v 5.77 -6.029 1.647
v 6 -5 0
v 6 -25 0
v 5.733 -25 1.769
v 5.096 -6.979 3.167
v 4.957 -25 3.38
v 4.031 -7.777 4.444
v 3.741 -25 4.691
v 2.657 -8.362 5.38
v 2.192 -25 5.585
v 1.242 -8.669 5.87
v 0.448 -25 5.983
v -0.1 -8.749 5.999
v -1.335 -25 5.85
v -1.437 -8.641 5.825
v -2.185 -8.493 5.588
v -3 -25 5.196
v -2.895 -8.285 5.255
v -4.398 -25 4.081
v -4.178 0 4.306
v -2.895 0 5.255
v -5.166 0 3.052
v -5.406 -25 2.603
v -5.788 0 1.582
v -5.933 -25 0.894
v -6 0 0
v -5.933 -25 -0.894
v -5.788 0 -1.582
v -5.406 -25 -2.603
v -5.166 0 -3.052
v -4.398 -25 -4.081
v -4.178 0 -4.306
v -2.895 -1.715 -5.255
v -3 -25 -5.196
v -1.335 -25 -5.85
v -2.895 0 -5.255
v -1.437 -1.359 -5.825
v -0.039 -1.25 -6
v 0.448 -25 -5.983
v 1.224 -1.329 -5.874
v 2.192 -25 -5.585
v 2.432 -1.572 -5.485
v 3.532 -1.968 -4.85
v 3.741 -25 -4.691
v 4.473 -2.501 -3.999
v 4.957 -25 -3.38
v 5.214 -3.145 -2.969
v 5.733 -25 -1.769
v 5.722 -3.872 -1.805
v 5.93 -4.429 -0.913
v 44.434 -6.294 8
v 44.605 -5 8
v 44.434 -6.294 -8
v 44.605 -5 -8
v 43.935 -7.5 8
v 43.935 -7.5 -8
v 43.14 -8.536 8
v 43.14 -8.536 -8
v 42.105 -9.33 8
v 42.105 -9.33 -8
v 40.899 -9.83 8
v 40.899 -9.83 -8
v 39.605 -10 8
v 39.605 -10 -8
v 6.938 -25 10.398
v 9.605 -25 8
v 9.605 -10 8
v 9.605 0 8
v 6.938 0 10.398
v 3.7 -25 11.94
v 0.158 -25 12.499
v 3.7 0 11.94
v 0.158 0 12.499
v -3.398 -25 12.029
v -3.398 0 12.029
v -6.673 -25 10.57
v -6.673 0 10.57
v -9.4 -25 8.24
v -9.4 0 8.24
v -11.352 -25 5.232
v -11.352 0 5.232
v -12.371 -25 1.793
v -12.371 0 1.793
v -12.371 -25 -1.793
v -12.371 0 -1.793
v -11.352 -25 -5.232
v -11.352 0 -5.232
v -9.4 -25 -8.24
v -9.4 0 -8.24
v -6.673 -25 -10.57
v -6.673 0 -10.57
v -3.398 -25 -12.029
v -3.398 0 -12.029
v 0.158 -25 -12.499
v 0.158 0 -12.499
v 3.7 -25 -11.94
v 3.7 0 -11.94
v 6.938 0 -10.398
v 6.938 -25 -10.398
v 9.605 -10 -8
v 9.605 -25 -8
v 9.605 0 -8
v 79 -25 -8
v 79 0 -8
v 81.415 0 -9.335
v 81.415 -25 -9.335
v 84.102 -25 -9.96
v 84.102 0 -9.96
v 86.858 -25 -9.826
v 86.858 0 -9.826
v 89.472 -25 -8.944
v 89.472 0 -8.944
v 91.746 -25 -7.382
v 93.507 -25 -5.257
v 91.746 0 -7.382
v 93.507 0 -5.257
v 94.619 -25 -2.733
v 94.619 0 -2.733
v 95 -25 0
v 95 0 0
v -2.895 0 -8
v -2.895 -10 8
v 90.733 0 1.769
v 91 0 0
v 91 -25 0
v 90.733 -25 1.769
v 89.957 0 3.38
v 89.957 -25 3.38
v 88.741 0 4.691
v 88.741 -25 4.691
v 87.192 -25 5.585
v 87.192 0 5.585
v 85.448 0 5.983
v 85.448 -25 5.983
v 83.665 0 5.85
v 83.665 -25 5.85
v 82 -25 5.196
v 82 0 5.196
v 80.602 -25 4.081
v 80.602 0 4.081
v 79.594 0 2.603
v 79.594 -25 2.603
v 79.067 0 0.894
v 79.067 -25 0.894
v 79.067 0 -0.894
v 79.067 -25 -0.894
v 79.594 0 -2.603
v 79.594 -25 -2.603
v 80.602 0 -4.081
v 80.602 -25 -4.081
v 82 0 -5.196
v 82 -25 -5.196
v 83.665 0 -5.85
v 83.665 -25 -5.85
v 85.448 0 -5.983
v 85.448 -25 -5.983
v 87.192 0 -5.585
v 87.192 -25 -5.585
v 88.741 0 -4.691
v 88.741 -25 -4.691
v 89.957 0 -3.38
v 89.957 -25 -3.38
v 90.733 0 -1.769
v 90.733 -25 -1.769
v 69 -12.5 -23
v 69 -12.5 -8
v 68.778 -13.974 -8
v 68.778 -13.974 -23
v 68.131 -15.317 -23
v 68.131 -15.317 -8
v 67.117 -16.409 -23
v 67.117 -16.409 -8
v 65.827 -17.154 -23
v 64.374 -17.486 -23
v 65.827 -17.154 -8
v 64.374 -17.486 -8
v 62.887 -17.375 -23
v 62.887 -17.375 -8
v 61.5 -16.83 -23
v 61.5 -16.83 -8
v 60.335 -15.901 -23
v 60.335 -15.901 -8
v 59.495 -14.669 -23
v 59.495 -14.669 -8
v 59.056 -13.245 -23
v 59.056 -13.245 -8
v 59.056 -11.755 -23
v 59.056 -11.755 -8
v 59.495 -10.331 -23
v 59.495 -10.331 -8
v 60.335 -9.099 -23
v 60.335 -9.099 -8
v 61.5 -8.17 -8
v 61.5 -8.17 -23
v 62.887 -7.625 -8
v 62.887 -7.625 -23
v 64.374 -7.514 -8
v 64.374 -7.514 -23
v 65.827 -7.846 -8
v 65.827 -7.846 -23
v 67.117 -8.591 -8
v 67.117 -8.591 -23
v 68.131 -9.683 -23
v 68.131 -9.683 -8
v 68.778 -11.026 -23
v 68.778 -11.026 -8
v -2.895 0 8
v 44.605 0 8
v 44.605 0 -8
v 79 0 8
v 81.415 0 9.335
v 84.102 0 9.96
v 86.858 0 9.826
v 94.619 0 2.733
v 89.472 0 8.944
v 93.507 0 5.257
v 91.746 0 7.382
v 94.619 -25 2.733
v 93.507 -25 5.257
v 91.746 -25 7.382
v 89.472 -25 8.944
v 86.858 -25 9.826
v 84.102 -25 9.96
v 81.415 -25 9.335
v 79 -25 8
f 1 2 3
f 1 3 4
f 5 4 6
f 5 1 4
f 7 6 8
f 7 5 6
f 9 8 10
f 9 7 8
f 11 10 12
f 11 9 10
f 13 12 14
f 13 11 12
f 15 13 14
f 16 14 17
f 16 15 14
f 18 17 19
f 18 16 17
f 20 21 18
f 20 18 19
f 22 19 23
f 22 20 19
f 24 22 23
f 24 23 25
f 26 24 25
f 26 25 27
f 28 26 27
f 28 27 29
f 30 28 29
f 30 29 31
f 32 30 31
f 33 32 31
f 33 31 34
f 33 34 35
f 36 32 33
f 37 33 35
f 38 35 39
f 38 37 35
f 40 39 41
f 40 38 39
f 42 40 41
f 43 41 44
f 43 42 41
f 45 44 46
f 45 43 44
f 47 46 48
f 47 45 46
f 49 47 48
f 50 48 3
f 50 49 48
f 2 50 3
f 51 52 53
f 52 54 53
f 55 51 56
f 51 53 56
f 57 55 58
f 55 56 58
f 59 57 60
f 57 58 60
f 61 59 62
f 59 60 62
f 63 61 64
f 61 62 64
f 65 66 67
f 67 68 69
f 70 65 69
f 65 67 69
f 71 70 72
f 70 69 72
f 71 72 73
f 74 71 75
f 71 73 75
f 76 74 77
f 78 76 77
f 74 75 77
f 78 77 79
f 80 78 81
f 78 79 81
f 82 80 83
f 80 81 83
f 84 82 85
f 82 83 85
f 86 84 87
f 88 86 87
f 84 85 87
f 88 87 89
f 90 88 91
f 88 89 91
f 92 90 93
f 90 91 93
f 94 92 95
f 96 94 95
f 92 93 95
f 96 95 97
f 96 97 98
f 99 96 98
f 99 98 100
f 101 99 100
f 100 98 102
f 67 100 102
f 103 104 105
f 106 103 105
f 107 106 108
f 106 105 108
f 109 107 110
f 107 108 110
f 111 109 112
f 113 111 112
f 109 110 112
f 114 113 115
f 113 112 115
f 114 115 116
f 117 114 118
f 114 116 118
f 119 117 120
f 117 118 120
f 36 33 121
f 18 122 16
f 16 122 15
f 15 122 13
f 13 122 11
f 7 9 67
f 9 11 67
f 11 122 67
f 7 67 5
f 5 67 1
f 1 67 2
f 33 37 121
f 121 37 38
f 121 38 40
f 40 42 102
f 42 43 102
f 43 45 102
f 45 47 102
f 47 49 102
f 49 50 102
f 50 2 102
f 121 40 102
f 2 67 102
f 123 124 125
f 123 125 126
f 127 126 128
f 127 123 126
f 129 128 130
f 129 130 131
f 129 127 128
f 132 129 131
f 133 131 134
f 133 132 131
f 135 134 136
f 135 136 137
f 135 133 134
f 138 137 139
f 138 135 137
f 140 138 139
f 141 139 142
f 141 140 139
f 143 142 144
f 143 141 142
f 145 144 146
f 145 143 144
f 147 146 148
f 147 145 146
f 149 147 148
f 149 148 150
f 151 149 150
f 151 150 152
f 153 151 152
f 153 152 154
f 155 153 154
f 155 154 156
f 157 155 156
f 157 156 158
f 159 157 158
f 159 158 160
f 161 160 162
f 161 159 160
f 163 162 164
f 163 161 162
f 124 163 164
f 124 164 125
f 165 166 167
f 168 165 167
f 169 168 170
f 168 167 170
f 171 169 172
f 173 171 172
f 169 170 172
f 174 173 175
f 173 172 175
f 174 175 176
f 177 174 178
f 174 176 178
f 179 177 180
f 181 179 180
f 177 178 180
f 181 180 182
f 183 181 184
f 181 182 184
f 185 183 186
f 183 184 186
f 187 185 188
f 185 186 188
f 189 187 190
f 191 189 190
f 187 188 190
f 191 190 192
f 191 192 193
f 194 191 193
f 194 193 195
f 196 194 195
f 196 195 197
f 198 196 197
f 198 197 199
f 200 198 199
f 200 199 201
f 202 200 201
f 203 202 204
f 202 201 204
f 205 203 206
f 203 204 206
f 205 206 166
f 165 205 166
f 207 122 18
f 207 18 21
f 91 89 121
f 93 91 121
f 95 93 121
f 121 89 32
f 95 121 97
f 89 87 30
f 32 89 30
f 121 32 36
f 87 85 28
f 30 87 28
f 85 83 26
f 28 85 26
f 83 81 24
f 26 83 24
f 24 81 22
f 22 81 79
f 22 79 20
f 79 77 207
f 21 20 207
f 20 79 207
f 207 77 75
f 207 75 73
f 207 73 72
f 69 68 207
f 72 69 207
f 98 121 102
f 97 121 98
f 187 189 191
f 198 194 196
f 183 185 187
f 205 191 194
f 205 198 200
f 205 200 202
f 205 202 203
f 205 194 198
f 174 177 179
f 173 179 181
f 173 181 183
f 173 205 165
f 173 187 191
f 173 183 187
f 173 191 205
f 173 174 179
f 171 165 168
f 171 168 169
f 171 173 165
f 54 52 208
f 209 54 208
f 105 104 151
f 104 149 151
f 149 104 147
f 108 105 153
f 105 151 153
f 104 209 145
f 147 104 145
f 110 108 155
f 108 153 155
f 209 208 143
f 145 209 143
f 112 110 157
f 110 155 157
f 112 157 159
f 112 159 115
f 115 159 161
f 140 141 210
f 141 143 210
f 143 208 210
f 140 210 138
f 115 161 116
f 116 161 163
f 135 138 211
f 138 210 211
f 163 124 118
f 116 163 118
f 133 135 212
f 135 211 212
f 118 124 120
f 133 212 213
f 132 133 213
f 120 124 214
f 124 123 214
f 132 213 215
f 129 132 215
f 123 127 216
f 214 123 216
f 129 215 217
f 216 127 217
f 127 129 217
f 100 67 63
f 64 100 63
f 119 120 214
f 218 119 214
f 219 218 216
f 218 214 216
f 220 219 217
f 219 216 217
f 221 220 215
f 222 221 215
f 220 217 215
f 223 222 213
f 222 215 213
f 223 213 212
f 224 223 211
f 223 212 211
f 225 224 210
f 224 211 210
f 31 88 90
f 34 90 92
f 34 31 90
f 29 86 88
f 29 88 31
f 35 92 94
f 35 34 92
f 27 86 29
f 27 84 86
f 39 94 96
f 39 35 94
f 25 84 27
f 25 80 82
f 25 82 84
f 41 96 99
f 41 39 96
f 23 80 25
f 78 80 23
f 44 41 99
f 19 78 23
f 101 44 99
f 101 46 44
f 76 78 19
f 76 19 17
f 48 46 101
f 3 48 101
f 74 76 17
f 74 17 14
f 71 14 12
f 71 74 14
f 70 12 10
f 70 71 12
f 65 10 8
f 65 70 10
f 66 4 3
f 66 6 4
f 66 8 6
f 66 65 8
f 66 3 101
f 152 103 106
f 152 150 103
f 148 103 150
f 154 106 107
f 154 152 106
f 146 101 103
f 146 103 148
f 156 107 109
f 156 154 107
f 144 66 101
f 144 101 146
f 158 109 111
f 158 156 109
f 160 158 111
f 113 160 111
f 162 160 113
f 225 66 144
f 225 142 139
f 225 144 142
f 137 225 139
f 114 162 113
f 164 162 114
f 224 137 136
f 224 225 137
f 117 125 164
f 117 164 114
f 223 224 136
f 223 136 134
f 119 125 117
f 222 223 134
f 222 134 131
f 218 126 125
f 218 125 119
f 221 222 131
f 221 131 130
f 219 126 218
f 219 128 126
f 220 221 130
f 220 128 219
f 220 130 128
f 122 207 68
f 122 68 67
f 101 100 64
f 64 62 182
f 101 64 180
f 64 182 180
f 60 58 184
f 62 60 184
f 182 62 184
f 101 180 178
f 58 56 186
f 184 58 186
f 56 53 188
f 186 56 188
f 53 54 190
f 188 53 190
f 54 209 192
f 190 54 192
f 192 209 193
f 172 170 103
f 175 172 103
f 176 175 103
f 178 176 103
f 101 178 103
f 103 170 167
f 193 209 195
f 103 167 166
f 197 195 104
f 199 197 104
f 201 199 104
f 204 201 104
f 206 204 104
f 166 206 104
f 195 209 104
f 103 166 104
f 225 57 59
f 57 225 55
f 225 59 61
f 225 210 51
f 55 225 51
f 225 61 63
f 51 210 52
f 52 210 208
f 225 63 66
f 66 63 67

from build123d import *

# Parameters (mm, degrees)
F0_R     = 6
F1_DEPTH = 25
F2_W     = 35
F2_H     = 10
F3_DEPTH = 20.501
F5_DEPTH = 12.5
F6_R     = 5
F7_R     = 5
F8_DEPTH = 15


with BuildPart() as f1:
    # F0 (on Front) → F1 (new body)
    with BuildSketch(Plane.XZ):
        with BuildLine():
            ThreePointArc((9.604686, -8), (11.753905, -4.253905), (12.5, 0))
            ThreePointArc((12.5, 0), (11.753905, 4.253905), (9.604686, 8))
            ThreePointArc((9.604686, 8), (-12.5, 0), (9.604686, -8))
        make_face()
        Circle(F0_R, mode=Mode.SUBTRACT)
        with BuildLine():
            ThreePointArc((9.604686, 8), (11.753905, 4.253905), (12.5, 0))
            ThreePointArc((12.5, 0), (11.753905, -4.253905), (9.604686, -8))
            Line((9.604686, -8), (79, -8))
            ThreePointArc((79, -8), (75, 0), (79, 8))
            Line((79, 8), (9.604686, 8))
        make_face()
        with BuildLine():
            ThreePointArc((95, 0), (89.472136, 8.944272), (79, 8))
            ThreePointArc((79, 8), (75, 0), (79, -8))
            ThreePointArc((79, -8), (89.472136, -8.944272), (95, 0))
        make_face()
        with Locations((85, 0)):
            Circle(F0_R, mode=Mode.SUBTRACT)
    extrude(amount=F1_DEPTH)

    # F2 (on face) → F3 (cut, through all)
    with BuildSketch(Plane.XY.offset(8)):
        with Locations((27.104686, -5)):
            Rectangle(F2_W, F2_H)
    extrude(amount=-F3_DEPTH, mode=Mode.SUBTRACT)

    # F4 (on face) → F5 (cut, symmetric)
    with BuildSketch(Plane.YZ.offset(9.604686)):
        Polygon((0, 8), (-10, 8), (0, -8), align=None)
    extrude(amount=F5_DEPTH, both=True, mode=Mode.SUBTRACT)

    # F6
    f6_edges = [f1.edges().sort_by_distance(p)[0] for p in [
        (44.604686, -10, 0),
    ]]
    fillet(f6_edges, radius=F6_R)

    # F7 (on face) → F8 (join)
    with BuildSketch(Plane(origin=(0, 0, -8), x_dir=(1, 0, 0), z_dir=(0, 0, -1))):
        with Locations((64, 12.5)):
            Circle(F7_R)
    extrude(amount=F8_DEPTH)


solid = f1.part
